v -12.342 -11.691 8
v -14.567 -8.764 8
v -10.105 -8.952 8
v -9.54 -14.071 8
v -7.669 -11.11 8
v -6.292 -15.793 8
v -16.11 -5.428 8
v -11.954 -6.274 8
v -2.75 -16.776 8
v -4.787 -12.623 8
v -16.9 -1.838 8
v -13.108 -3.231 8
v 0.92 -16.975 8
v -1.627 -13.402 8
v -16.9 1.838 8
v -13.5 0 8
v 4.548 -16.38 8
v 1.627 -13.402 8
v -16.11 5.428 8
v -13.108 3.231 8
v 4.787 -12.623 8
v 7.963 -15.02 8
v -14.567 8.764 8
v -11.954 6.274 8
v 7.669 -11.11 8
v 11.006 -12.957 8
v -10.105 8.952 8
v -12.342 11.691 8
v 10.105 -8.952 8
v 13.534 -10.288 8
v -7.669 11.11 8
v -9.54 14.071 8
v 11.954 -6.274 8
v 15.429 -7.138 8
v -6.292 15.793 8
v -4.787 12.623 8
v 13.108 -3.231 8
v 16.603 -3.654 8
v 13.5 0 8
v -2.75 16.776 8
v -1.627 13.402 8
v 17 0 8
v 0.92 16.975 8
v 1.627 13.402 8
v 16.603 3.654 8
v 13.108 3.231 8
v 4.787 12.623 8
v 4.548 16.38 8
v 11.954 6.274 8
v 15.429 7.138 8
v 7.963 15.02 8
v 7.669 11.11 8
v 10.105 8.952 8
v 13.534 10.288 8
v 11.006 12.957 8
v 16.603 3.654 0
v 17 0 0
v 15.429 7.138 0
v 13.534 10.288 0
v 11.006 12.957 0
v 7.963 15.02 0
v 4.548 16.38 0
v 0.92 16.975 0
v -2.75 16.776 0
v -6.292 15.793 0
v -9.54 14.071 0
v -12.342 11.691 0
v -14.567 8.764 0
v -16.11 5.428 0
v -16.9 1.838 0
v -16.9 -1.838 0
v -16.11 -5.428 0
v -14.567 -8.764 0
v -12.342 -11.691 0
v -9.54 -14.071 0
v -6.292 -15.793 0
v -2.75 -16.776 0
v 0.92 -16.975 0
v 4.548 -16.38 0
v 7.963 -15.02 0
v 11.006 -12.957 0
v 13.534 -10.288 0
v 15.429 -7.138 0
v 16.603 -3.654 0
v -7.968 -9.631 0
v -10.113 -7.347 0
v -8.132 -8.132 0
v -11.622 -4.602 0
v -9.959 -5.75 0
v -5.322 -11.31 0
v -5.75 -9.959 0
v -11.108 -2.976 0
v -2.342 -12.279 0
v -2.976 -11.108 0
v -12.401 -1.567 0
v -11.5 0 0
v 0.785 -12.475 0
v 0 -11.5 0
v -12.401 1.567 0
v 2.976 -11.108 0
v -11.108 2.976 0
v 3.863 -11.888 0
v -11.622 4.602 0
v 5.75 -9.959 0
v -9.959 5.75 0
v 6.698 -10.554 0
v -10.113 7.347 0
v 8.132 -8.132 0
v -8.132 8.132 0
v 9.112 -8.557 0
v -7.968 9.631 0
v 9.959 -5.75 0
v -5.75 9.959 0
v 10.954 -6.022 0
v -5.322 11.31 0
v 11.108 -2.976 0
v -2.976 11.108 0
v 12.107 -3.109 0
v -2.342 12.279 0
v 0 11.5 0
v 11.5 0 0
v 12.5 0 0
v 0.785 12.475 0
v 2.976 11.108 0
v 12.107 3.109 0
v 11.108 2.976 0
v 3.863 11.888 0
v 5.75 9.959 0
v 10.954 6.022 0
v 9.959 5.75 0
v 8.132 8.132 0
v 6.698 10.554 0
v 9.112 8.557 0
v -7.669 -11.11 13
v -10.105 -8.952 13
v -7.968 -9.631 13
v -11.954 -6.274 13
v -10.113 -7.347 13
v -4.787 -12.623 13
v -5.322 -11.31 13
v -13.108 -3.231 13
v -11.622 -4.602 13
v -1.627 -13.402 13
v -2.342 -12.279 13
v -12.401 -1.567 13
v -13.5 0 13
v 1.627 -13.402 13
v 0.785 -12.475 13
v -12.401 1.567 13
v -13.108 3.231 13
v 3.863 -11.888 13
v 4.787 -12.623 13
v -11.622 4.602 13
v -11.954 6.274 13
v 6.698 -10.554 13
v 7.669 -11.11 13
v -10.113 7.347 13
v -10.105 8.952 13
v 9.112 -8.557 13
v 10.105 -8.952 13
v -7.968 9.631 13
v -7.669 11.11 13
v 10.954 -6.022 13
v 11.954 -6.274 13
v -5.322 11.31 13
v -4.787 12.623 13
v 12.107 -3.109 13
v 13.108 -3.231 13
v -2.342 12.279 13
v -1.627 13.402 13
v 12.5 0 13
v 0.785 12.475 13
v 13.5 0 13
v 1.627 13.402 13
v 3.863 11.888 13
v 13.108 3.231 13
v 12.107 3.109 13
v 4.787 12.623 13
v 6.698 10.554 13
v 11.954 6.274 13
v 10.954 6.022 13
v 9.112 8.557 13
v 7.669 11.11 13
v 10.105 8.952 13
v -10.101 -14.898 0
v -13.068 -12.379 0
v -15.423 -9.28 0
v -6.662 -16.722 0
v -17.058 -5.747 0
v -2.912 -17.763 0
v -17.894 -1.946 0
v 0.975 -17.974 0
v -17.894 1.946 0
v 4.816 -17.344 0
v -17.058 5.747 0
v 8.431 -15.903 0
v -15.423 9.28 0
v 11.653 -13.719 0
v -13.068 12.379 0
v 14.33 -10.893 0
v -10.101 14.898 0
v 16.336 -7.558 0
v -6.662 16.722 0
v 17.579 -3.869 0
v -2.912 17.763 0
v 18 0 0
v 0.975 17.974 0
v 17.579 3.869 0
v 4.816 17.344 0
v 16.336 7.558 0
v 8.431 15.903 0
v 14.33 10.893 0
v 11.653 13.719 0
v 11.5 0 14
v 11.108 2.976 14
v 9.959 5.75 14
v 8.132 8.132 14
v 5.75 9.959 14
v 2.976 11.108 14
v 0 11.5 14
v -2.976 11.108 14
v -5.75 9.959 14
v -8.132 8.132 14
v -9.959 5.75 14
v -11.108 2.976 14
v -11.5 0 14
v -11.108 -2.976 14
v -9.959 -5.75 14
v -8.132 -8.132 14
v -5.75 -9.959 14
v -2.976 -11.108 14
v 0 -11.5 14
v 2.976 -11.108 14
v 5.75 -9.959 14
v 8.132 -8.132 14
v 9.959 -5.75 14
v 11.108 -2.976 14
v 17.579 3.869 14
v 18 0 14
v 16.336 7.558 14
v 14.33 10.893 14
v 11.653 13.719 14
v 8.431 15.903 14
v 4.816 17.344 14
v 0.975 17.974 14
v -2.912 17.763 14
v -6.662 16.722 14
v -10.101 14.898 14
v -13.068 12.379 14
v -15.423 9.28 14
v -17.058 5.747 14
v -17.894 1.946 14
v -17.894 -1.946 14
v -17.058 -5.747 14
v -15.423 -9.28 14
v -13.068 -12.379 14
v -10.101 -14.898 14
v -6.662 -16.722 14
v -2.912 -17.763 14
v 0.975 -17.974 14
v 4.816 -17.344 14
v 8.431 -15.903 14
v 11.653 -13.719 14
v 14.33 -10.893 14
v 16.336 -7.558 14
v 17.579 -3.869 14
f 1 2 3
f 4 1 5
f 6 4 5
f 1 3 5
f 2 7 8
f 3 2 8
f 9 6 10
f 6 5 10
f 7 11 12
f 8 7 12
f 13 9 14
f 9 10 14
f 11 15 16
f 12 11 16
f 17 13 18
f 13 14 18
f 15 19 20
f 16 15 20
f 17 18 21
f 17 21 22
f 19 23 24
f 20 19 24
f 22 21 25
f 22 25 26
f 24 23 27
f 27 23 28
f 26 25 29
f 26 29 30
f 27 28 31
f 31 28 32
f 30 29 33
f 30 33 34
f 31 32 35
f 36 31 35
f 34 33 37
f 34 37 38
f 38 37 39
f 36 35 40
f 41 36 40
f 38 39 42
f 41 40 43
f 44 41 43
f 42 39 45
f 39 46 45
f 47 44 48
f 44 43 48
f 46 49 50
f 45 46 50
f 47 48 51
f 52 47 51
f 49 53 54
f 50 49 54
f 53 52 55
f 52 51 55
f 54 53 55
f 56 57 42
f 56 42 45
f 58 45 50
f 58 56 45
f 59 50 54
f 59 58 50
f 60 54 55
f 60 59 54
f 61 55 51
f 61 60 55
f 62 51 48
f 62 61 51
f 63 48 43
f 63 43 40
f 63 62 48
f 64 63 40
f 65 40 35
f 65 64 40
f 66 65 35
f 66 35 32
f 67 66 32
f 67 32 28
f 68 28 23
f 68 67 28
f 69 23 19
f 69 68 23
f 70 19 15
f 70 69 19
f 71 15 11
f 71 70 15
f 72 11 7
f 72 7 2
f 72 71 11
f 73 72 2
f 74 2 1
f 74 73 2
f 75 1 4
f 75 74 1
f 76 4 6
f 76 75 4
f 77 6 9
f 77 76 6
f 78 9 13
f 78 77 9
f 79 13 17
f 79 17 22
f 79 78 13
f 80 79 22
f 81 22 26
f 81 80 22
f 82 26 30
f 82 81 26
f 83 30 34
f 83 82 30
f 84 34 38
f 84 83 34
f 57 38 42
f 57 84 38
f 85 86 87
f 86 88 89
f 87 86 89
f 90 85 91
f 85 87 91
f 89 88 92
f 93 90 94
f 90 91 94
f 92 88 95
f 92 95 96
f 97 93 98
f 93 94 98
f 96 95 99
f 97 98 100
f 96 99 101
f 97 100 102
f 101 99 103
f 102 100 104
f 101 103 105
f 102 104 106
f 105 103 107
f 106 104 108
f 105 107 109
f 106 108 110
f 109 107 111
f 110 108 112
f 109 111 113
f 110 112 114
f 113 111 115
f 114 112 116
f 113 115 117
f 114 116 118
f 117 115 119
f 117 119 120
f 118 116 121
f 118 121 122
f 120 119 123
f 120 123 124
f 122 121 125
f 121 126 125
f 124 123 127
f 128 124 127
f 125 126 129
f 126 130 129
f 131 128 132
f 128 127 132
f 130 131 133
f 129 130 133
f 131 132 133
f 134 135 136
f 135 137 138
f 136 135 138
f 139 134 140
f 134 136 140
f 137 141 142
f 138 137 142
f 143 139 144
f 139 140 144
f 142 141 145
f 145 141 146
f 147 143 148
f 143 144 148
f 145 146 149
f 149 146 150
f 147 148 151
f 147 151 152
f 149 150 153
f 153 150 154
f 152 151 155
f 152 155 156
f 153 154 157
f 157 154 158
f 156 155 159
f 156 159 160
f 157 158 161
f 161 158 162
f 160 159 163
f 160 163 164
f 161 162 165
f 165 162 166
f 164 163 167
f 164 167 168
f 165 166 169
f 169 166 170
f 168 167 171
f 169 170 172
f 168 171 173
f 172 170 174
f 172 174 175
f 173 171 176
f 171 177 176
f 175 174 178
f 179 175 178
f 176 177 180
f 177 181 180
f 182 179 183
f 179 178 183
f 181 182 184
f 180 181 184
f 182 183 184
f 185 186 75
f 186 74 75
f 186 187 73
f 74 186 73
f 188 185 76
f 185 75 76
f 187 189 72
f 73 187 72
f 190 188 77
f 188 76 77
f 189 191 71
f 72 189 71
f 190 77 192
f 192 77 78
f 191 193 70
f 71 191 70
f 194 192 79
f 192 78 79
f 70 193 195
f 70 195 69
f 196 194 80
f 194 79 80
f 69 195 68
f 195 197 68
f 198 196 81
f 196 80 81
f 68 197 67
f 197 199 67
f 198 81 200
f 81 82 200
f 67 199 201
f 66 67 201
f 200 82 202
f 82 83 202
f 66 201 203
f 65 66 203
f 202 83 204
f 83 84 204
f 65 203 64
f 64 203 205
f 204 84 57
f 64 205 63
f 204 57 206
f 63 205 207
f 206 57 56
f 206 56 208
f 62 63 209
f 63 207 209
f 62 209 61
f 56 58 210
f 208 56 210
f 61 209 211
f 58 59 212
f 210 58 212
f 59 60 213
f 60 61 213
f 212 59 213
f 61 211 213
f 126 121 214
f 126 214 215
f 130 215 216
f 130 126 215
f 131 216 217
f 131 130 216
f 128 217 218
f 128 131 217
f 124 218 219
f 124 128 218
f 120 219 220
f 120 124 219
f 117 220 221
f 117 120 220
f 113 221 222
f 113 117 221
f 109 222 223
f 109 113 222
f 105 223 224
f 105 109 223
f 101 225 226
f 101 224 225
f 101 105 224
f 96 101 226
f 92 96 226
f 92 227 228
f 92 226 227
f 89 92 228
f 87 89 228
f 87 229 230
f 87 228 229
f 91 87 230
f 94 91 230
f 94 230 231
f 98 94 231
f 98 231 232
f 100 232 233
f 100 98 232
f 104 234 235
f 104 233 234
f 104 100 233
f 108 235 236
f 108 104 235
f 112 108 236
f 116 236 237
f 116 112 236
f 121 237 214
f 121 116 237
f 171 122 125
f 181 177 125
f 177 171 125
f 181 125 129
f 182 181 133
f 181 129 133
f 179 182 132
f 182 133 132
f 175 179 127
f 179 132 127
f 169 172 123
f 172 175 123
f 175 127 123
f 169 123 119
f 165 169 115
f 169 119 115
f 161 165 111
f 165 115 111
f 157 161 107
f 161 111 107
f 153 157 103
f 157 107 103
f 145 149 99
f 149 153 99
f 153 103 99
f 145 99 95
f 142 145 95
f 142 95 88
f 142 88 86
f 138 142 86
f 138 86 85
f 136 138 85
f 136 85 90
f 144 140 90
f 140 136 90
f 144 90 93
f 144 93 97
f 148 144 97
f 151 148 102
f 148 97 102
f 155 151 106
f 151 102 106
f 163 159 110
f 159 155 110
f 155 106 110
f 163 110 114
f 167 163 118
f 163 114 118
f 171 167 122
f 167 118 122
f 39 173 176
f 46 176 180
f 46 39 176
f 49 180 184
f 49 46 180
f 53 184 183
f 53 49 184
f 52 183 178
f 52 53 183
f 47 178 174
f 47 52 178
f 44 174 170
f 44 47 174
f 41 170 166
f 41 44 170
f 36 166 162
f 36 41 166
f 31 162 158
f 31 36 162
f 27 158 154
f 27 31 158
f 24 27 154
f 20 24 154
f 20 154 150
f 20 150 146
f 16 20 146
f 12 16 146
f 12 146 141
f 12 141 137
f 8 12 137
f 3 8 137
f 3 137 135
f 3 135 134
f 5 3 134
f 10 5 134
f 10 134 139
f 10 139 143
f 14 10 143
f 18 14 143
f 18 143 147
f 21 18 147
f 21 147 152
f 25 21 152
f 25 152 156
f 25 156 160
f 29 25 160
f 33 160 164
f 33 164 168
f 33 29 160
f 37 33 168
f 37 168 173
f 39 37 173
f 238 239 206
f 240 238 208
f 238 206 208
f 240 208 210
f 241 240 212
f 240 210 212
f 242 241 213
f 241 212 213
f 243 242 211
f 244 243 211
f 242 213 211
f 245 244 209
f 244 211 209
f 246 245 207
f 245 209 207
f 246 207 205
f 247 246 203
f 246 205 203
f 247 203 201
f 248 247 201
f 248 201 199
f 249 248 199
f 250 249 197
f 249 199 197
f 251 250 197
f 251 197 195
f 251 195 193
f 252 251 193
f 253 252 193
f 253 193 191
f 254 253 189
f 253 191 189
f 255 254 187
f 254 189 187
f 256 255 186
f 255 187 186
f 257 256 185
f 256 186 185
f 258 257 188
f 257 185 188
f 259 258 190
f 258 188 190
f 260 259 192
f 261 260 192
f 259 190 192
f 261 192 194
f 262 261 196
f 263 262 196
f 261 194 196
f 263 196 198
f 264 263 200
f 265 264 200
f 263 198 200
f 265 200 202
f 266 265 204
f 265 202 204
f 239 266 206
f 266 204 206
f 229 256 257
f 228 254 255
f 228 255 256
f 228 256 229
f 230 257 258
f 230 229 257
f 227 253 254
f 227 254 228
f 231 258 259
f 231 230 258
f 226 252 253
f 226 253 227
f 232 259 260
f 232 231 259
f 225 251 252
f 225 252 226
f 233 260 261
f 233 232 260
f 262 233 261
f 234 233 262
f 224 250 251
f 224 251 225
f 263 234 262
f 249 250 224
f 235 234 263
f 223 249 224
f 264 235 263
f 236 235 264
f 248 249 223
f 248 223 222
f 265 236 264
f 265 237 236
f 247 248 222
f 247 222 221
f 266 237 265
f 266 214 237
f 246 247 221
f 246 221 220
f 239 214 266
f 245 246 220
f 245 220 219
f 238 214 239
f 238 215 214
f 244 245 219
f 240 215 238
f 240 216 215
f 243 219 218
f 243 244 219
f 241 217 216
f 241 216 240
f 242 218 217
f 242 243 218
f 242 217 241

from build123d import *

# Parameters (mm, degrees)
CYLINDER001_R     = 12.5
CYLINDER001_DEPTH = 24
CYLINDER002_R     = 13.5
CYLINDER002_DEPTH = 13
CYLINDER_R        = 17
CYLINDER_DEPTH    = 8
CYLINDER003_R     = 11.5
CYLINDER003_DEPTH = 25
CYLINDER004_R     = 18
CYLINDER004_DEPTH = 14


with BuildPart() as innerhole:
    # Cylinder001 → Cylinder001 (new body)
    with BuildSketch(Plane.XY.offset(-5)):
        Circle(CYLINDER001_R)
    extrude(amount=CYLINDER001_DEPTH)


with BuildPart() as sleeve:
    # Cylinder002 → Cylinder002 (new body)
    with BuildSketch(Plane.XY):
        Circle(CYLINDER002_R)
    extrude(amount=CYLINDER002_DEPTH)


with BuildPart() as cut:
    # Cylinder → Cylinder (new body)
    with BuildSketch(Plane.XY):
        Circle(CYLINDER_R)
    extrude(amount=CYLINDER_DEPTH)

    # Fusion: union Sleeve
    add(sleeve.part)

    # Cut: cut InnerHole
    add(innerhole.part, mode=Mode.SUBTRACT)


with BuildPart() as materialsaving:
    # Cylinder003 → Cylinder003 (new body)
    with BuildSketch(Plane.XY):
        Circle(CYLINDER003_R)
    extrude(amount=CYLINDER003_DEPTH)


with BuildPart() as cut002:
    # Cylinder004 → Cylinder004 (new body)
    with BuildSketch(Plane.XY):
        Circle(CYLINDER004_R)
    extrude(amount=CYLINDER004_DEPTH)

    # Cut001: cut MaterialSaving
    add(materialsaving.part, mode=Mode.SUBTRACT)

    # Cut002: cut Cut
    add(cut.part, mode=Mode.SUBTRACT)


solid = cut002.part
